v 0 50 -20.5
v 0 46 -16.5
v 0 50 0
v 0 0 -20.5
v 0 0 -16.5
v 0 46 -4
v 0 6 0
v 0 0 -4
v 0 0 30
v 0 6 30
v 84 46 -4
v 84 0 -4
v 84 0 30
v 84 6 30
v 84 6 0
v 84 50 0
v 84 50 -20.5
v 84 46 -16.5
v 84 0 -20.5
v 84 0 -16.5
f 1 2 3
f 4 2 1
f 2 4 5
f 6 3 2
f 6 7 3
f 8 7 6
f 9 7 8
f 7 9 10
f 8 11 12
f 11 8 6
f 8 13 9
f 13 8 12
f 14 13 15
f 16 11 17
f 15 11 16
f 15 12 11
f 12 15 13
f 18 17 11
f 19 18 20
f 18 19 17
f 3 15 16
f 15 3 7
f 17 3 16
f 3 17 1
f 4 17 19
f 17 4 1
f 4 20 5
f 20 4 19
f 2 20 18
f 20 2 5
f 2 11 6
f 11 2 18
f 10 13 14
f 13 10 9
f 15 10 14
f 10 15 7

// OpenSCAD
// 8-tube PCR strip holder that hooks over a 12 mm bucket wall
// Printed as used: rests on XY plane (z=0), builds upward (+Z), centred on x=0.
// Profile is in the YZ plane, extruded 84 mm along X.

$fn = 64;

// ---- Overall extrusion (X direction) ----
L = 84;          // extrusion length along X (centred on x=0)

// ---- Upside-down U profile (YZ plane) ----
z0 = 0;          // bottom of legs (sits on XY plane)
z1 = 50;        // top of legs / bridge
y_inner_lo = 0;  // inner leg, low Y
y_inner_hi = 4;  // inner leg, high Y  (4 mm thick)
y_outer_lo = 16.5; // outer leg, low Y
y_outer_hi = 20.5; // outer leg, high Y (4 mm thick)
z_bridge_lo = 46;  // bridge bottom (leaves 12.5 mm gap for 12 mm wall)
z_bridge_hi = 50;  // bridge top

// ---- Flat ledge (into the ice, toward -Y) ----
y_ledge_lo = -30; // ledge extends from y=0 to y=-30
y_ledge_hi = 0;
z_ledge_lo = 0;   // 6 mm thick ledge
z_ledge_hi = 6;

// ---- Tube holes ----
hole_d = 6.4;    // through-hole diameter
hole_pitch = 9;  // spacing along X
n_holes = 8;     // number of holes
y_hole = -15;    // hole centre Y

// ---- Build the solid ----
difference() {
    // Rotate so the extrusion (originally +Z) becomes +X,
    // and the profile's local X (Y-coord) becomes Y, local Y (Z-coord) becomes Z.
    rotate([0, 90, 0])
    union() {
        // Inner leg
        linear_extrude(L)
            polygon([
                [y_inner_lo, z0],
                [y_inner_hi, z0],
                [y_inner_hi, z1],
                [y_inner_lo, z1]
            ]);

        // Outer leg
        linear_extrude(L)
            polygon([
                [y_outer_lo, z0],
                [y_outer_hi, z0],
                [y_outer_hi, z1],
                [y_outer_lo, z1]
            ]);

        // Bridge joining the two legs at the top
        linear_extrude(L)
            polygon([
                [y_inner_lo, z_bridge_lo],
                [y_outer_hi, z_bridge_lo],
                [y_outer_hi, z_bridge_hi],
                [y_inner_lo, z_bridge_hi]
            ]);

        // Flat ledge reaching toward -Y from the foot of the inner leg
        linear_extrude(L)
            polygon([
                [y_ledge_lo, z_ledge_lo],
                [y_ledge_hi, z_ledge_lo],
                [y_ledge_hi, z_ledge_hi],
                [y_ledge_lo, z_ledge_hi]
            ]);
    }

    // Eight vertical 6.4 mm through-holes in the ledge, 9 mm apart along X, centred, at y=-15
    for (i = [0 : n_holes - 1]) {
        x_hole = (i - (n_holes - 1) / 2) * hole_pitch;
        translate([x_hole, y_hole, z_ledge_lo - 1])
            cylinder(h = (z_ledge_hi - z_ledge_lo) + 2, r = hole_d / 2, $fn = 64);
    }
}
